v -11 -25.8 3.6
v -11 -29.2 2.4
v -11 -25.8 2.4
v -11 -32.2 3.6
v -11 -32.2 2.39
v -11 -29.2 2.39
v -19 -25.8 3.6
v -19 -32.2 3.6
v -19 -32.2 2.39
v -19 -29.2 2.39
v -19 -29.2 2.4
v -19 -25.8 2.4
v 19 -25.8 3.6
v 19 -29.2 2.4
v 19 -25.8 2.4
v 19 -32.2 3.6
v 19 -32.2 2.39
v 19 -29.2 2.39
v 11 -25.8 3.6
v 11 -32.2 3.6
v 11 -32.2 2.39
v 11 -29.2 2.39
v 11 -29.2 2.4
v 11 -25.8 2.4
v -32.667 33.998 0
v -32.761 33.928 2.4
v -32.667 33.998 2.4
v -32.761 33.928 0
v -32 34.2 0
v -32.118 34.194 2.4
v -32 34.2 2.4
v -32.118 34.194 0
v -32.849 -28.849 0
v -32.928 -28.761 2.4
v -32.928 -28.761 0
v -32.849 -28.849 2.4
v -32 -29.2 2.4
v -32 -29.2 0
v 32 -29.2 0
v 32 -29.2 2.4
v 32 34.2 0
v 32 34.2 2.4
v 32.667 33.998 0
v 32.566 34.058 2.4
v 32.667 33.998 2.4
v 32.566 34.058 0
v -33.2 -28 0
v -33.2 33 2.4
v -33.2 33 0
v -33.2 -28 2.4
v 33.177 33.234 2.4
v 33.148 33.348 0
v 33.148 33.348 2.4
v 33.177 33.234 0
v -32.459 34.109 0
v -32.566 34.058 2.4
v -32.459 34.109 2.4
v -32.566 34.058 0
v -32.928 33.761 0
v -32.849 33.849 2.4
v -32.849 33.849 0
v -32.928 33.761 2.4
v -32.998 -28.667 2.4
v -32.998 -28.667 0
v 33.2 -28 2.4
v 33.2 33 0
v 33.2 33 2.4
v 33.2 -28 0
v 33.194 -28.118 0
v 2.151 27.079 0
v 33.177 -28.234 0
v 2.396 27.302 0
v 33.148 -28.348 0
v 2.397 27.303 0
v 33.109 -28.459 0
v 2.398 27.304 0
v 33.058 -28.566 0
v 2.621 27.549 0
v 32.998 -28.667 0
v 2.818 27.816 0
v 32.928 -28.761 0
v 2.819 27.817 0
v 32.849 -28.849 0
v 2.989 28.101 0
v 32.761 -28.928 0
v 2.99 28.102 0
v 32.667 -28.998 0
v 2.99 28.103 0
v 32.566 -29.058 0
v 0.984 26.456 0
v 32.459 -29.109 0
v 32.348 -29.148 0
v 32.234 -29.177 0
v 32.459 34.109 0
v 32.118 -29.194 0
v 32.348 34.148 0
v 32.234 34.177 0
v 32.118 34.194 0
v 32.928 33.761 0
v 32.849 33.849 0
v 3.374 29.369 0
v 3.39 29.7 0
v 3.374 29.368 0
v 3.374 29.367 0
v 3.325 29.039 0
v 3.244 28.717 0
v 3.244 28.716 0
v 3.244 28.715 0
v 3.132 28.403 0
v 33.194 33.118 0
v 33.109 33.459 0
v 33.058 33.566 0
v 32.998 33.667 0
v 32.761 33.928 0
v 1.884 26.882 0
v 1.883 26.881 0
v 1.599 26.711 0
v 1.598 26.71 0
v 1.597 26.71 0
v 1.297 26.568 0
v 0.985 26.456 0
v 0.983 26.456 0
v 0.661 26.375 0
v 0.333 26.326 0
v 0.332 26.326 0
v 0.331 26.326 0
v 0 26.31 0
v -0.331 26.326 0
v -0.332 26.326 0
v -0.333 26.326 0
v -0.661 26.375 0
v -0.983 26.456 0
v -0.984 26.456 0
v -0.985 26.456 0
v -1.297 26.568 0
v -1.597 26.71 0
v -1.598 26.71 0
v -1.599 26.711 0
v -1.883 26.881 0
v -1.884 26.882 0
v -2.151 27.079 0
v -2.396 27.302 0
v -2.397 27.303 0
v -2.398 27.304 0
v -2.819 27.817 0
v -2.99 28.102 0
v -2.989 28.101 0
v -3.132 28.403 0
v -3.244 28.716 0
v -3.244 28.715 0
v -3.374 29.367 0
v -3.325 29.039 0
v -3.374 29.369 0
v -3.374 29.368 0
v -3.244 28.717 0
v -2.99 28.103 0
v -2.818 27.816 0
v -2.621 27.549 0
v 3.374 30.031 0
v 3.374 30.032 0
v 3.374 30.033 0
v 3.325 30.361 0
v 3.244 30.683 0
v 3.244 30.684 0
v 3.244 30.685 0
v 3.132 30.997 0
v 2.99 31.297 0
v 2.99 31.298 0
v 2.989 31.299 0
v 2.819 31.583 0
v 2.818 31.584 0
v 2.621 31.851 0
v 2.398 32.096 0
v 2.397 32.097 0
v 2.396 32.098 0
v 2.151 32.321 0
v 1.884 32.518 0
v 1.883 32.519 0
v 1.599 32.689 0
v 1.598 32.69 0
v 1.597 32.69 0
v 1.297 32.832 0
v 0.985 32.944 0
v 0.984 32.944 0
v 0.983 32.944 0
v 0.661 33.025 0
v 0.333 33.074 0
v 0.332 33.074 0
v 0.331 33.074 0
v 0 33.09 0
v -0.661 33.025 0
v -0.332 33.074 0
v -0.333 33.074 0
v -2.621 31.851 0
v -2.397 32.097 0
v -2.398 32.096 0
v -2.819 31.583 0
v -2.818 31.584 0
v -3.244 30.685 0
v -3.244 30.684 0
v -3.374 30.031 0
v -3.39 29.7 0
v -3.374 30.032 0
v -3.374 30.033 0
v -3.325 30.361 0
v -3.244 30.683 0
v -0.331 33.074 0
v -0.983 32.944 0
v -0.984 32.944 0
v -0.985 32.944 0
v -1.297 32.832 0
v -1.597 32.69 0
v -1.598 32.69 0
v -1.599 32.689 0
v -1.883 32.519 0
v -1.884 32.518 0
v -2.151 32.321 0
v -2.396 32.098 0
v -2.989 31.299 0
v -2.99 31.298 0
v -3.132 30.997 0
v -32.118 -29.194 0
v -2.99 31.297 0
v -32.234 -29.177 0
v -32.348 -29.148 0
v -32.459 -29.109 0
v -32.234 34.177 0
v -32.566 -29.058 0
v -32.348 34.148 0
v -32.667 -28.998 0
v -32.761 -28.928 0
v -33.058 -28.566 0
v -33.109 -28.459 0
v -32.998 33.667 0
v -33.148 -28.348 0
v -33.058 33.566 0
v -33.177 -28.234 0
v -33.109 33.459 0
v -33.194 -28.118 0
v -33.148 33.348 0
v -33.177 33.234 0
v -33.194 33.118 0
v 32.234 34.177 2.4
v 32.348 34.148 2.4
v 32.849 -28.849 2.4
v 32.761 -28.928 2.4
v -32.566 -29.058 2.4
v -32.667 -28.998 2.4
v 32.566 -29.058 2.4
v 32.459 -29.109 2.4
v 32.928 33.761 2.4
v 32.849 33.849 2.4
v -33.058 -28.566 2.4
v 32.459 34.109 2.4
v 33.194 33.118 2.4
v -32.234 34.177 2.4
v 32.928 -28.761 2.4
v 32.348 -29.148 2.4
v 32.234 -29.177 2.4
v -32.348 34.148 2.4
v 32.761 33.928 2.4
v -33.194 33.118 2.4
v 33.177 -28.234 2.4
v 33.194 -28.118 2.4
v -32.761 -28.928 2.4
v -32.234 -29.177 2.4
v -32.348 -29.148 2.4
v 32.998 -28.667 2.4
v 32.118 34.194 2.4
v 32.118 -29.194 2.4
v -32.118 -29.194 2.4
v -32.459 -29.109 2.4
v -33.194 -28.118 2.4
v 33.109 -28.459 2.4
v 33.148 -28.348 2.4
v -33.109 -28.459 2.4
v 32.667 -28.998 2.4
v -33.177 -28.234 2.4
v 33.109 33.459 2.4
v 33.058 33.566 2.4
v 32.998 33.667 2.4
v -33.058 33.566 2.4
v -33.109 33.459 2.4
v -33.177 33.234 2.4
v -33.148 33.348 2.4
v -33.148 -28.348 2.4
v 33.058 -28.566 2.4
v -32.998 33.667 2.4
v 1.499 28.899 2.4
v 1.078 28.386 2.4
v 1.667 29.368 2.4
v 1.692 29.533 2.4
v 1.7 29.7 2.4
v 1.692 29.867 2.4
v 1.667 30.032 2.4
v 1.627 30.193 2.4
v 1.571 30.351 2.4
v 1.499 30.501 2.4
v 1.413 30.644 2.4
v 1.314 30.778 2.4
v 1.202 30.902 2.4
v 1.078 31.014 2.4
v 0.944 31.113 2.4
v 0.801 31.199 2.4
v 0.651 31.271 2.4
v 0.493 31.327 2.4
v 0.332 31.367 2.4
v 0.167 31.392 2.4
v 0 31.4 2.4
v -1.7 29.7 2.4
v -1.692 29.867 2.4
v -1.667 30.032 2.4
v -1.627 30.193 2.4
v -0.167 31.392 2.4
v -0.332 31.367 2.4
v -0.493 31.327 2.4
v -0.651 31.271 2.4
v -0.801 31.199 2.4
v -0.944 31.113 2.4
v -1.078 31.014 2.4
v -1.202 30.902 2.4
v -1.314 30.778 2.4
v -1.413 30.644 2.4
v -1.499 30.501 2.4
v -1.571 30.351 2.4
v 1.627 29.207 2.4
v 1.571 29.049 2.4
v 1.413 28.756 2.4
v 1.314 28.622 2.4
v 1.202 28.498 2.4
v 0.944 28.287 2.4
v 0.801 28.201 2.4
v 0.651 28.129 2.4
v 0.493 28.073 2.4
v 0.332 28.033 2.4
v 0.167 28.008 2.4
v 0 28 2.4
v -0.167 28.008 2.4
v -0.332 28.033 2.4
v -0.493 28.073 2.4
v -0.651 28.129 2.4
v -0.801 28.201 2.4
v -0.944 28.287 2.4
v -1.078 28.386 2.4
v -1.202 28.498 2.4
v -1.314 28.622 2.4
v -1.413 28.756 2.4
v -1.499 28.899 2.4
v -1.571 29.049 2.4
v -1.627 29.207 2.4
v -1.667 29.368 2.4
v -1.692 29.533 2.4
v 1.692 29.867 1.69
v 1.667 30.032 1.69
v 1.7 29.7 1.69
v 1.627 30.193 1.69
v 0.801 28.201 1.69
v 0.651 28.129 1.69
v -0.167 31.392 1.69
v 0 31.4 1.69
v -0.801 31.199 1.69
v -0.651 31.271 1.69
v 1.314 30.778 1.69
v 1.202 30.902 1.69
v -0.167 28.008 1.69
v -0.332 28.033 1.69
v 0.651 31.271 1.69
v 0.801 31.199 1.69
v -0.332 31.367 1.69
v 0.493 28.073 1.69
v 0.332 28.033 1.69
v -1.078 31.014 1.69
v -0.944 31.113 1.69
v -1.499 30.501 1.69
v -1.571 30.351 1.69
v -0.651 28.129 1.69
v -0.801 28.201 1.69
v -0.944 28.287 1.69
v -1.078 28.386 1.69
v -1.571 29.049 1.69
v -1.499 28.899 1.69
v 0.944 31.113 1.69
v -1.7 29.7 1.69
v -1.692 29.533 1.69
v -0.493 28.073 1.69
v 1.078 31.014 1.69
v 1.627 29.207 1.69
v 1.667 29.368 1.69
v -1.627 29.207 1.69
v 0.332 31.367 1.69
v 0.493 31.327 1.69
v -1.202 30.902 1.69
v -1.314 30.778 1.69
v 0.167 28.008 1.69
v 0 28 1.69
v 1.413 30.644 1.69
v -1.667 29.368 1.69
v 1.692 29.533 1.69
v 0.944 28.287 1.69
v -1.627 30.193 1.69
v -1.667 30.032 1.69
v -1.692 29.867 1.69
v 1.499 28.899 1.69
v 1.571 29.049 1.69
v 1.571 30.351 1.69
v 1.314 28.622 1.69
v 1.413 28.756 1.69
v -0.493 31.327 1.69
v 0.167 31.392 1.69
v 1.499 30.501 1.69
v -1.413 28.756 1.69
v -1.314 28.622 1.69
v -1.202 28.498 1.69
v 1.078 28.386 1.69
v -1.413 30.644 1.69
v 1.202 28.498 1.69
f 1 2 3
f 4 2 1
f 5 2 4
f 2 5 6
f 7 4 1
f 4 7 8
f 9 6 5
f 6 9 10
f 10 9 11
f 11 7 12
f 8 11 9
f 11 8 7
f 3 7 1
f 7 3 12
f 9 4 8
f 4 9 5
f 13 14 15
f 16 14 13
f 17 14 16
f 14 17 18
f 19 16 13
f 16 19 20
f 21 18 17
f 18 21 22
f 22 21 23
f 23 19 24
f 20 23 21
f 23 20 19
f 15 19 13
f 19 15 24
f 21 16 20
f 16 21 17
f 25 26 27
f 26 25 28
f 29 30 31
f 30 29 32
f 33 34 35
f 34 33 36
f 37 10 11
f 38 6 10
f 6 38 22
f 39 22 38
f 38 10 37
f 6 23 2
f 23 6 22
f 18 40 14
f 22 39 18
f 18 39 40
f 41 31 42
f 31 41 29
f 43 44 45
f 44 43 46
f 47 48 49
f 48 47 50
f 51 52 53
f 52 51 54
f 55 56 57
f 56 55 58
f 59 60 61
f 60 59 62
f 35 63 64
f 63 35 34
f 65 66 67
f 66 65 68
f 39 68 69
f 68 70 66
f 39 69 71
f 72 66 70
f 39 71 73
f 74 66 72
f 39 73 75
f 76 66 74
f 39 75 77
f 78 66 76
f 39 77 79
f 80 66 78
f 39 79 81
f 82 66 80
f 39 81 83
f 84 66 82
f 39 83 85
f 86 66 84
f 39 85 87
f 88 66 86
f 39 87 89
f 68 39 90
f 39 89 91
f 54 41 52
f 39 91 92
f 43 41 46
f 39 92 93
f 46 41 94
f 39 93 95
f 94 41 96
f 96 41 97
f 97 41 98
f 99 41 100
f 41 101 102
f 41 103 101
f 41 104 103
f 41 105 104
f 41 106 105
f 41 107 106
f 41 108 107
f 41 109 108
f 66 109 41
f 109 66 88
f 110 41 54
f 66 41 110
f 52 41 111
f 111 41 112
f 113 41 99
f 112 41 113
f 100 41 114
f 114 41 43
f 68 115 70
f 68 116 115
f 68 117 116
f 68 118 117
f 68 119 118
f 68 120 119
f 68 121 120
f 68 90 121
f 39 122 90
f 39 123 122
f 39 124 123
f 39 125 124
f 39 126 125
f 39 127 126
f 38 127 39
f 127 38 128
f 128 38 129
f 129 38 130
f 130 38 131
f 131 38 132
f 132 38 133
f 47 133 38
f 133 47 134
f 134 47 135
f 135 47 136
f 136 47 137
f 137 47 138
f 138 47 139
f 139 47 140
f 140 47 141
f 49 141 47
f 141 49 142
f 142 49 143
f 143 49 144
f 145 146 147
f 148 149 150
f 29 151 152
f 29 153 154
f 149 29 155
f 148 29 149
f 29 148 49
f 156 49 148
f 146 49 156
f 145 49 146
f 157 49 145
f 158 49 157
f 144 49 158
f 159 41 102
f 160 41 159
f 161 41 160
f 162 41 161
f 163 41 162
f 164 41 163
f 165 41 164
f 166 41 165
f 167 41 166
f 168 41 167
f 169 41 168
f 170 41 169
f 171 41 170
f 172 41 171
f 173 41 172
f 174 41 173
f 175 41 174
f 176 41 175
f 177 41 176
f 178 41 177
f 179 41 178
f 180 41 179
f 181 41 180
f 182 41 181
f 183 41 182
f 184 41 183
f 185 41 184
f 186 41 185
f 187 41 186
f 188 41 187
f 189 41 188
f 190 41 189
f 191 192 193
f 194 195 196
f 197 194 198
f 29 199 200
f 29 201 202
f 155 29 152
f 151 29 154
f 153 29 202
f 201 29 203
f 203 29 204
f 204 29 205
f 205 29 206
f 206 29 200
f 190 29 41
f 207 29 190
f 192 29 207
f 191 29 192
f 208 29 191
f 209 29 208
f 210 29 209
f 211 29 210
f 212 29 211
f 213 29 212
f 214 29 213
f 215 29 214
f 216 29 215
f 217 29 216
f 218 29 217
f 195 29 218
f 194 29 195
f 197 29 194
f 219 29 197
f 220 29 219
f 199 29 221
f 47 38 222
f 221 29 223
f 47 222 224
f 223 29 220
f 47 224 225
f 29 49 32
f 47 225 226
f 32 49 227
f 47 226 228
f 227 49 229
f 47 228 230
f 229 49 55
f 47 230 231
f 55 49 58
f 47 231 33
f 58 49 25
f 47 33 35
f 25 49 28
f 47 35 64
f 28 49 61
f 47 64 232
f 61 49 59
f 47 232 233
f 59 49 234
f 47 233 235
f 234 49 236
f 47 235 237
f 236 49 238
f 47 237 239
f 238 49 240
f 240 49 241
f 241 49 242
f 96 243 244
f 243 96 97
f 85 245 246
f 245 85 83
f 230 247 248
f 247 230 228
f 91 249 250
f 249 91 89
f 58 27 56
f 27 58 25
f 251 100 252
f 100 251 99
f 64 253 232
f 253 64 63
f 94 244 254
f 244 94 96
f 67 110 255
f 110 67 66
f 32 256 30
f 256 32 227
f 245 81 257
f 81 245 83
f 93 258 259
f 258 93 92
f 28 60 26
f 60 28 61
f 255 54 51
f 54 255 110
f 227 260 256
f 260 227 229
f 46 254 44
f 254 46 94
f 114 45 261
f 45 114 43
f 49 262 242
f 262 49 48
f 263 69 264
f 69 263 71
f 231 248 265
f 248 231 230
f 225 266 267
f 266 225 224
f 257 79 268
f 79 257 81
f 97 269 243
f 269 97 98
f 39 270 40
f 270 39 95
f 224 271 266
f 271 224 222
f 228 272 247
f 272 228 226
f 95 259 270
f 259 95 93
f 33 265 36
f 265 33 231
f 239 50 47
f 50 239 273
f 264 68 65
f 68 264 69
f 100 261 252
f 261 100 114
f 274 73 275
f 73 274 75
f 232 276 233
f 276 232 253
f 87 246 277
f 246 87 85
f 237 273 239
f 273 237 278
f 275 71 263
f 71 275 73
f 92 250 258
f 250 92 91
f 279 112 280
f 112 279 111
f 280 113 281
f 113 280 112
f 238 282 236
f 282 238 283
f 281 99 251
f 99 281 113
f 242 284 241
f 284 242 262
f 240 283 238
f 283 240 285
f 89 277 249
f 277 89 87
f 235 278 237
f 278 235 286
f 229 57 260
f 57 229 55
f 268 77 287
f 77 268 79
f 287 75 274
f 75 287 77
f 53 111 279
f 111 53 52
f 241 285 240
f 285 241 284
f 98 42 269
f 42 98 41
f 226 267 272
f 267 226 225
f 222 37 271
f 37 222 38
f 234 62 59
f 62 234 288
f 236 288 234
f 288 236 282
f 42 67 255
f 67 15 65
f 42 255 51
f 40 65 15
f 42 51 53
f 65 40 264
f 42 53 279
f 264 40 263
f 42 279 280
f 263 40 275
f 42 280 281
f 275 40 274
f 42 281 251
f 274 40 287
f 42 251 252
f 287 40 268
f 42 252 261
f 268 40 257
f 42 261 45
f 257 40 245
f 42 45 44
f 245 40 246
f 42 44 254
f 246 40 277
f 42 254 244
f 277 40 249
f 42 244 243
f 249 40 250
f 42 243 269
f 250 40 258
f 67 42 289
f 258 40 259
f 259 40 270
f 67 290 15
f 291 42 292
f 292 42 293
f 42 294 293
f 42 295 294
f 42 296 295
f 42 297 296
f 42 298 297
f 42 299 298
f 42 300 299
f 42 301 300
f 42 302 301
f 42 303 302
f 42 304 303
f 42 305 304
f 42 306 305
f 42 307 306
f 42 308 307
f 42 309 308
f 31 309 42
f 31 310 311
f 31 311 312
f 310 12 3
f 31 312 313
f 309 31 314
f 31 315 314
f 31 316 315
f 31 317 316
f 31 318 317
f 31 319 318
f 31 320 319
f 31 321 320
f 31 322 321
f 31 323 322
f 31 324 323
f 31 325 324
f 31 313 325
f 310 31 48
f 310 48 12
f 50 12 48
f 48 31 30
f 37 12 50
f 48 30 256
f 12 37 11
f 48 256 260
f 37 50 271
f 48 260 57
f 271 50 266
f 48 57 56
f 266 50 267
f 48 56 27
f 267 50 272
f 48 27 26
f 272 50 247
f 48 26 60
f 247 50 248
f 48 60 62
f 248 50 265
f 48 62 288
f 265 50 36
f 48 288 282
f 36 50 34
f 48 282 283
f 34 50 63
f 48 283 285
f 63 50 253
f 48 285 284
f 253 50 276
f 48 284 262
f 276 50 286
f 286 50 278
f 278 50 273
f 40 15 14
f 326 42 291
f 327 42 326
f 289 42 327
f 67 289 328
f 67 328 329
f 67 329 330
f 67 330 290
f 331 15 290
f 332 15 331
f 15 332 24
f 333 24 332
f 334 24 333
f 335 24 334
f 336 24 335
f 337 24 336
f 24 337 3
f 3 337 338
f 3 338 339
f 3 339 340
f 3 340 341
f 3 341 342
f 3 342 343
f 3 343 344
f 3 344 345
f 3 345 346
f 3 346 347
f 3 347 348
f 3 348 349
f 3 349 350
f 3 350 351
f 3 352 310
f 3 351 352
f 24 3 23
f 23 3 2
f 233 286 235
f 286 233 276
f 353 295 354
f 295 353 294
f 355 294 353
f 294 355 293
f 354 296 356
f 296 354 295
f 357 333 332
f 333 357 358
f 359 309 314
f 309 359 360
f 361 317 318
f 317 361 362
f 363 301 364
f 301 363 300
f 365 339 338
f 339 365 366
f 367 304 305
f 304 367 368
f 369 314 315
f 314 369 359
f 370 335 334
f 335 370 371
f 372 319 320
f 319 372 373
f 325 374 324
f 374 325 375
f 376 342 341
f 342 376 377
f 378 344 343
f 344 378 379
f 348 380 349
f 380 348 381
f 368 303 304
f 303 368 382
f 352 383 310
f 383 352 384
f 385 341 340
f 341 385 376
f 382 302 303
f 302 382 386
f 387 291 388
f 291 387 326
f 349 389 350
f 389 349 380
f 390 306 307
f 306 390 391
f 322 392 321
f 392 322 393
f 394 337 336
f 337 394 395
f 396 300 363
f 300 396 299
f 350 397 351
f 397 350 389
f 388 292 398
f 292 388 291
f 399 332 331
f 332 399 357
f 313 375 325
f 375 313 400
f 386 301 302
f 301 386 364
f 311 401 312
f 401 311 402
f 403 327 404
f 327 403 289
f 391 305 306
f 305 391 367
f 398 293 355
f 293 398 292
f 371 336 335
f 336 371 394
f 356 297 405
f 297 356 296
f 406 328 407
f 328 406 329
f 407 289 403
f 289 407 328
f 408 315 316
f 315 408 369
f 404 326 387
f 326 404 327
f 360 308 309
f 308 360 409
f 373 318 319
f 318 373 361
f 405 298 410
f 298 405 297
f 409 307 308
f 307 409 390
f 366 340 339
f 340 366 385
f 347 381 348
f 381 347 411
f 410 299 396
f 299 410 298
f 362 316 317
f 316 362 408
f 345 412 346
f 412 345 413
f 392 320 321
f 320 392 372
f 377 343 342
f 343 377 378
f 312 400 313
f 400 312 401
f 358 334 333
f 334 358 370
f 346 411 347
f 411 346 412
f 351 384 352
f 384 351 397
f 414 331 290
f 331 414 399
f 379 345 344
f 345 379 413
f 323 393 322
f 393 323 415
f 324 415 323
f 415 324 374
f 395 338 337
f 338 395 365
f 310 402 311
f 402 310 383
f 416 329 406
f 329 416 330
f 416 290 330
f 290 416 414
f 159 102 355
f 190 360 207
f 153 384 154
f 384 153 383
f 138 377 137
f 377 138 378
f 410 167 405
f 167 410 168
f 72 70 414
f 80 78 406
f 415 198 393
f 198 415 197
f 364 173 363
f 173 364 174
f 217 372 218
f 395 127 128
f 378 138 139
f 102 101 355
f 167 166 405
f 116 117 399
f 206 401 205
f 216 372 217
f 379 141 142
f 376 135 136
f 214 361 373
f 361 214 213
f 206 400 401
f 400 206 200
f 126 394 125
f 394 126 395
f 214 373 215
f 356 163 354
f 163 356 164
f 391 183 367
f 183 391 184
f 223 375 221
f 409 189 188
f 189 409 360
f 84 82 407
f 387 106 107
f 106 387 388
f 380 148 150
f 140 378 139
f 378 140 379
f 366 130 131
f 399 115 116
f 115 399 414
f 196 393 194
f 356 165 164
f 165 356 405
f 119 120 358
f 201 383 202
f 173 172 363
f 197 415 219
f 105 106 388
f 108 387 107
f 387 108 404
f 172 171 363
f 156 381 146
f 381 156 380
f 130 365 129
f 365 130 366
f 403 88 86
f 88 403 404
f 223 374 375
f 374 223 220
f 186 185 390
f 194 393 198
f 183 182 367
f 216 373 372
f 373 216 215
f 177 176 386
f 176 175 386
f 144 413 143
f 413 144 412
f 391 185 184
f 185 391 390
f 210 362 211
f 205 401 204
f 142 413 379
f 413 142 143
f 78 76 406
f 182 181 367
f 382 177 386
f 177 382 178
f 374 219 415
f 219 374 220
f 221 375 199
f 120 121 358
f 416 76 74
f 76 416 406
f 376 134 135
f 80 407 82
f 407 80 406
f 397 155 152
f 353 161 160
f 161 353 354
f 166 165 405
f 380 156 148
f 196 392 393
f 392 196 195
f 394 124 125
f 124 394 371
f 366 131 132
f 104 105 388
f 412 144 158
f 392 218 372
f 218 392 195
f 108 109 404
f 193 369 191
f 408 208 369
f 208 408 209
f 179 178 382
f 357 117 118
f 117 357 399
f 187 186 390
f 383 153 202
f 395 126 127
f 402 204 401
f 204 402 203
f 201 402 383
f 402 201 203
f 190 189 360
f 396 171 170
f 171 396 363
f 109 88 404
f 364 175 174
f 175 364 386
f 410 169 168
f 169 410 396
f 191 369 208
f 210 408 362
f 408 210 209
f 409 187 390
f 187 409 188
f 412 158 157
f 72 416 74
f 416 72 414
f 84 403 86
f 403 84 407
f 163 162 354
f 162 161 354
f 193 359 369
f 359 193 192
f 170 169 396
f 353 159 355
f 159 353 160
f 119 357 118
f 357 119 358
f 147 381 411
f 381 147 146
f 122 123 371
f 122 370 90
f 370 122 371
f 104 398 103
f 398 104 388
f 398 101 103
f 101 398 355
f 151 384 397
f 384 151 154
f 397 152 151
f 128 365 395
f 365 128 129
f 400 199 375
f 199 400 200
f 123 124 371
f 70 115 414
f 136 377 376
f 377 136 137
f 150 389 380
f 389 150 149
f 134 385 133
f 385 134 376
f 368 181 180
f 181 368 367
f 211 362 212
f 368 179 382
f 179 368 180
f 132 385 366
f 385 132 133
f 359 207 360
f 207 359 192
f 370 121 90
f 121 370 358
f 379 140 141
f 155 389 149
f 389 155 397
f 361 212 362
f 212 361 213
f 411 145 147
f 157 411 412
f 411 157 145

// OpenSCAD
// Busy board enclosure - screwed battery compartment door
// Render this file to generate busy_board_battery_door.stl

include <_busy_board_enclosure.scad>

busy_board_battery_door();
